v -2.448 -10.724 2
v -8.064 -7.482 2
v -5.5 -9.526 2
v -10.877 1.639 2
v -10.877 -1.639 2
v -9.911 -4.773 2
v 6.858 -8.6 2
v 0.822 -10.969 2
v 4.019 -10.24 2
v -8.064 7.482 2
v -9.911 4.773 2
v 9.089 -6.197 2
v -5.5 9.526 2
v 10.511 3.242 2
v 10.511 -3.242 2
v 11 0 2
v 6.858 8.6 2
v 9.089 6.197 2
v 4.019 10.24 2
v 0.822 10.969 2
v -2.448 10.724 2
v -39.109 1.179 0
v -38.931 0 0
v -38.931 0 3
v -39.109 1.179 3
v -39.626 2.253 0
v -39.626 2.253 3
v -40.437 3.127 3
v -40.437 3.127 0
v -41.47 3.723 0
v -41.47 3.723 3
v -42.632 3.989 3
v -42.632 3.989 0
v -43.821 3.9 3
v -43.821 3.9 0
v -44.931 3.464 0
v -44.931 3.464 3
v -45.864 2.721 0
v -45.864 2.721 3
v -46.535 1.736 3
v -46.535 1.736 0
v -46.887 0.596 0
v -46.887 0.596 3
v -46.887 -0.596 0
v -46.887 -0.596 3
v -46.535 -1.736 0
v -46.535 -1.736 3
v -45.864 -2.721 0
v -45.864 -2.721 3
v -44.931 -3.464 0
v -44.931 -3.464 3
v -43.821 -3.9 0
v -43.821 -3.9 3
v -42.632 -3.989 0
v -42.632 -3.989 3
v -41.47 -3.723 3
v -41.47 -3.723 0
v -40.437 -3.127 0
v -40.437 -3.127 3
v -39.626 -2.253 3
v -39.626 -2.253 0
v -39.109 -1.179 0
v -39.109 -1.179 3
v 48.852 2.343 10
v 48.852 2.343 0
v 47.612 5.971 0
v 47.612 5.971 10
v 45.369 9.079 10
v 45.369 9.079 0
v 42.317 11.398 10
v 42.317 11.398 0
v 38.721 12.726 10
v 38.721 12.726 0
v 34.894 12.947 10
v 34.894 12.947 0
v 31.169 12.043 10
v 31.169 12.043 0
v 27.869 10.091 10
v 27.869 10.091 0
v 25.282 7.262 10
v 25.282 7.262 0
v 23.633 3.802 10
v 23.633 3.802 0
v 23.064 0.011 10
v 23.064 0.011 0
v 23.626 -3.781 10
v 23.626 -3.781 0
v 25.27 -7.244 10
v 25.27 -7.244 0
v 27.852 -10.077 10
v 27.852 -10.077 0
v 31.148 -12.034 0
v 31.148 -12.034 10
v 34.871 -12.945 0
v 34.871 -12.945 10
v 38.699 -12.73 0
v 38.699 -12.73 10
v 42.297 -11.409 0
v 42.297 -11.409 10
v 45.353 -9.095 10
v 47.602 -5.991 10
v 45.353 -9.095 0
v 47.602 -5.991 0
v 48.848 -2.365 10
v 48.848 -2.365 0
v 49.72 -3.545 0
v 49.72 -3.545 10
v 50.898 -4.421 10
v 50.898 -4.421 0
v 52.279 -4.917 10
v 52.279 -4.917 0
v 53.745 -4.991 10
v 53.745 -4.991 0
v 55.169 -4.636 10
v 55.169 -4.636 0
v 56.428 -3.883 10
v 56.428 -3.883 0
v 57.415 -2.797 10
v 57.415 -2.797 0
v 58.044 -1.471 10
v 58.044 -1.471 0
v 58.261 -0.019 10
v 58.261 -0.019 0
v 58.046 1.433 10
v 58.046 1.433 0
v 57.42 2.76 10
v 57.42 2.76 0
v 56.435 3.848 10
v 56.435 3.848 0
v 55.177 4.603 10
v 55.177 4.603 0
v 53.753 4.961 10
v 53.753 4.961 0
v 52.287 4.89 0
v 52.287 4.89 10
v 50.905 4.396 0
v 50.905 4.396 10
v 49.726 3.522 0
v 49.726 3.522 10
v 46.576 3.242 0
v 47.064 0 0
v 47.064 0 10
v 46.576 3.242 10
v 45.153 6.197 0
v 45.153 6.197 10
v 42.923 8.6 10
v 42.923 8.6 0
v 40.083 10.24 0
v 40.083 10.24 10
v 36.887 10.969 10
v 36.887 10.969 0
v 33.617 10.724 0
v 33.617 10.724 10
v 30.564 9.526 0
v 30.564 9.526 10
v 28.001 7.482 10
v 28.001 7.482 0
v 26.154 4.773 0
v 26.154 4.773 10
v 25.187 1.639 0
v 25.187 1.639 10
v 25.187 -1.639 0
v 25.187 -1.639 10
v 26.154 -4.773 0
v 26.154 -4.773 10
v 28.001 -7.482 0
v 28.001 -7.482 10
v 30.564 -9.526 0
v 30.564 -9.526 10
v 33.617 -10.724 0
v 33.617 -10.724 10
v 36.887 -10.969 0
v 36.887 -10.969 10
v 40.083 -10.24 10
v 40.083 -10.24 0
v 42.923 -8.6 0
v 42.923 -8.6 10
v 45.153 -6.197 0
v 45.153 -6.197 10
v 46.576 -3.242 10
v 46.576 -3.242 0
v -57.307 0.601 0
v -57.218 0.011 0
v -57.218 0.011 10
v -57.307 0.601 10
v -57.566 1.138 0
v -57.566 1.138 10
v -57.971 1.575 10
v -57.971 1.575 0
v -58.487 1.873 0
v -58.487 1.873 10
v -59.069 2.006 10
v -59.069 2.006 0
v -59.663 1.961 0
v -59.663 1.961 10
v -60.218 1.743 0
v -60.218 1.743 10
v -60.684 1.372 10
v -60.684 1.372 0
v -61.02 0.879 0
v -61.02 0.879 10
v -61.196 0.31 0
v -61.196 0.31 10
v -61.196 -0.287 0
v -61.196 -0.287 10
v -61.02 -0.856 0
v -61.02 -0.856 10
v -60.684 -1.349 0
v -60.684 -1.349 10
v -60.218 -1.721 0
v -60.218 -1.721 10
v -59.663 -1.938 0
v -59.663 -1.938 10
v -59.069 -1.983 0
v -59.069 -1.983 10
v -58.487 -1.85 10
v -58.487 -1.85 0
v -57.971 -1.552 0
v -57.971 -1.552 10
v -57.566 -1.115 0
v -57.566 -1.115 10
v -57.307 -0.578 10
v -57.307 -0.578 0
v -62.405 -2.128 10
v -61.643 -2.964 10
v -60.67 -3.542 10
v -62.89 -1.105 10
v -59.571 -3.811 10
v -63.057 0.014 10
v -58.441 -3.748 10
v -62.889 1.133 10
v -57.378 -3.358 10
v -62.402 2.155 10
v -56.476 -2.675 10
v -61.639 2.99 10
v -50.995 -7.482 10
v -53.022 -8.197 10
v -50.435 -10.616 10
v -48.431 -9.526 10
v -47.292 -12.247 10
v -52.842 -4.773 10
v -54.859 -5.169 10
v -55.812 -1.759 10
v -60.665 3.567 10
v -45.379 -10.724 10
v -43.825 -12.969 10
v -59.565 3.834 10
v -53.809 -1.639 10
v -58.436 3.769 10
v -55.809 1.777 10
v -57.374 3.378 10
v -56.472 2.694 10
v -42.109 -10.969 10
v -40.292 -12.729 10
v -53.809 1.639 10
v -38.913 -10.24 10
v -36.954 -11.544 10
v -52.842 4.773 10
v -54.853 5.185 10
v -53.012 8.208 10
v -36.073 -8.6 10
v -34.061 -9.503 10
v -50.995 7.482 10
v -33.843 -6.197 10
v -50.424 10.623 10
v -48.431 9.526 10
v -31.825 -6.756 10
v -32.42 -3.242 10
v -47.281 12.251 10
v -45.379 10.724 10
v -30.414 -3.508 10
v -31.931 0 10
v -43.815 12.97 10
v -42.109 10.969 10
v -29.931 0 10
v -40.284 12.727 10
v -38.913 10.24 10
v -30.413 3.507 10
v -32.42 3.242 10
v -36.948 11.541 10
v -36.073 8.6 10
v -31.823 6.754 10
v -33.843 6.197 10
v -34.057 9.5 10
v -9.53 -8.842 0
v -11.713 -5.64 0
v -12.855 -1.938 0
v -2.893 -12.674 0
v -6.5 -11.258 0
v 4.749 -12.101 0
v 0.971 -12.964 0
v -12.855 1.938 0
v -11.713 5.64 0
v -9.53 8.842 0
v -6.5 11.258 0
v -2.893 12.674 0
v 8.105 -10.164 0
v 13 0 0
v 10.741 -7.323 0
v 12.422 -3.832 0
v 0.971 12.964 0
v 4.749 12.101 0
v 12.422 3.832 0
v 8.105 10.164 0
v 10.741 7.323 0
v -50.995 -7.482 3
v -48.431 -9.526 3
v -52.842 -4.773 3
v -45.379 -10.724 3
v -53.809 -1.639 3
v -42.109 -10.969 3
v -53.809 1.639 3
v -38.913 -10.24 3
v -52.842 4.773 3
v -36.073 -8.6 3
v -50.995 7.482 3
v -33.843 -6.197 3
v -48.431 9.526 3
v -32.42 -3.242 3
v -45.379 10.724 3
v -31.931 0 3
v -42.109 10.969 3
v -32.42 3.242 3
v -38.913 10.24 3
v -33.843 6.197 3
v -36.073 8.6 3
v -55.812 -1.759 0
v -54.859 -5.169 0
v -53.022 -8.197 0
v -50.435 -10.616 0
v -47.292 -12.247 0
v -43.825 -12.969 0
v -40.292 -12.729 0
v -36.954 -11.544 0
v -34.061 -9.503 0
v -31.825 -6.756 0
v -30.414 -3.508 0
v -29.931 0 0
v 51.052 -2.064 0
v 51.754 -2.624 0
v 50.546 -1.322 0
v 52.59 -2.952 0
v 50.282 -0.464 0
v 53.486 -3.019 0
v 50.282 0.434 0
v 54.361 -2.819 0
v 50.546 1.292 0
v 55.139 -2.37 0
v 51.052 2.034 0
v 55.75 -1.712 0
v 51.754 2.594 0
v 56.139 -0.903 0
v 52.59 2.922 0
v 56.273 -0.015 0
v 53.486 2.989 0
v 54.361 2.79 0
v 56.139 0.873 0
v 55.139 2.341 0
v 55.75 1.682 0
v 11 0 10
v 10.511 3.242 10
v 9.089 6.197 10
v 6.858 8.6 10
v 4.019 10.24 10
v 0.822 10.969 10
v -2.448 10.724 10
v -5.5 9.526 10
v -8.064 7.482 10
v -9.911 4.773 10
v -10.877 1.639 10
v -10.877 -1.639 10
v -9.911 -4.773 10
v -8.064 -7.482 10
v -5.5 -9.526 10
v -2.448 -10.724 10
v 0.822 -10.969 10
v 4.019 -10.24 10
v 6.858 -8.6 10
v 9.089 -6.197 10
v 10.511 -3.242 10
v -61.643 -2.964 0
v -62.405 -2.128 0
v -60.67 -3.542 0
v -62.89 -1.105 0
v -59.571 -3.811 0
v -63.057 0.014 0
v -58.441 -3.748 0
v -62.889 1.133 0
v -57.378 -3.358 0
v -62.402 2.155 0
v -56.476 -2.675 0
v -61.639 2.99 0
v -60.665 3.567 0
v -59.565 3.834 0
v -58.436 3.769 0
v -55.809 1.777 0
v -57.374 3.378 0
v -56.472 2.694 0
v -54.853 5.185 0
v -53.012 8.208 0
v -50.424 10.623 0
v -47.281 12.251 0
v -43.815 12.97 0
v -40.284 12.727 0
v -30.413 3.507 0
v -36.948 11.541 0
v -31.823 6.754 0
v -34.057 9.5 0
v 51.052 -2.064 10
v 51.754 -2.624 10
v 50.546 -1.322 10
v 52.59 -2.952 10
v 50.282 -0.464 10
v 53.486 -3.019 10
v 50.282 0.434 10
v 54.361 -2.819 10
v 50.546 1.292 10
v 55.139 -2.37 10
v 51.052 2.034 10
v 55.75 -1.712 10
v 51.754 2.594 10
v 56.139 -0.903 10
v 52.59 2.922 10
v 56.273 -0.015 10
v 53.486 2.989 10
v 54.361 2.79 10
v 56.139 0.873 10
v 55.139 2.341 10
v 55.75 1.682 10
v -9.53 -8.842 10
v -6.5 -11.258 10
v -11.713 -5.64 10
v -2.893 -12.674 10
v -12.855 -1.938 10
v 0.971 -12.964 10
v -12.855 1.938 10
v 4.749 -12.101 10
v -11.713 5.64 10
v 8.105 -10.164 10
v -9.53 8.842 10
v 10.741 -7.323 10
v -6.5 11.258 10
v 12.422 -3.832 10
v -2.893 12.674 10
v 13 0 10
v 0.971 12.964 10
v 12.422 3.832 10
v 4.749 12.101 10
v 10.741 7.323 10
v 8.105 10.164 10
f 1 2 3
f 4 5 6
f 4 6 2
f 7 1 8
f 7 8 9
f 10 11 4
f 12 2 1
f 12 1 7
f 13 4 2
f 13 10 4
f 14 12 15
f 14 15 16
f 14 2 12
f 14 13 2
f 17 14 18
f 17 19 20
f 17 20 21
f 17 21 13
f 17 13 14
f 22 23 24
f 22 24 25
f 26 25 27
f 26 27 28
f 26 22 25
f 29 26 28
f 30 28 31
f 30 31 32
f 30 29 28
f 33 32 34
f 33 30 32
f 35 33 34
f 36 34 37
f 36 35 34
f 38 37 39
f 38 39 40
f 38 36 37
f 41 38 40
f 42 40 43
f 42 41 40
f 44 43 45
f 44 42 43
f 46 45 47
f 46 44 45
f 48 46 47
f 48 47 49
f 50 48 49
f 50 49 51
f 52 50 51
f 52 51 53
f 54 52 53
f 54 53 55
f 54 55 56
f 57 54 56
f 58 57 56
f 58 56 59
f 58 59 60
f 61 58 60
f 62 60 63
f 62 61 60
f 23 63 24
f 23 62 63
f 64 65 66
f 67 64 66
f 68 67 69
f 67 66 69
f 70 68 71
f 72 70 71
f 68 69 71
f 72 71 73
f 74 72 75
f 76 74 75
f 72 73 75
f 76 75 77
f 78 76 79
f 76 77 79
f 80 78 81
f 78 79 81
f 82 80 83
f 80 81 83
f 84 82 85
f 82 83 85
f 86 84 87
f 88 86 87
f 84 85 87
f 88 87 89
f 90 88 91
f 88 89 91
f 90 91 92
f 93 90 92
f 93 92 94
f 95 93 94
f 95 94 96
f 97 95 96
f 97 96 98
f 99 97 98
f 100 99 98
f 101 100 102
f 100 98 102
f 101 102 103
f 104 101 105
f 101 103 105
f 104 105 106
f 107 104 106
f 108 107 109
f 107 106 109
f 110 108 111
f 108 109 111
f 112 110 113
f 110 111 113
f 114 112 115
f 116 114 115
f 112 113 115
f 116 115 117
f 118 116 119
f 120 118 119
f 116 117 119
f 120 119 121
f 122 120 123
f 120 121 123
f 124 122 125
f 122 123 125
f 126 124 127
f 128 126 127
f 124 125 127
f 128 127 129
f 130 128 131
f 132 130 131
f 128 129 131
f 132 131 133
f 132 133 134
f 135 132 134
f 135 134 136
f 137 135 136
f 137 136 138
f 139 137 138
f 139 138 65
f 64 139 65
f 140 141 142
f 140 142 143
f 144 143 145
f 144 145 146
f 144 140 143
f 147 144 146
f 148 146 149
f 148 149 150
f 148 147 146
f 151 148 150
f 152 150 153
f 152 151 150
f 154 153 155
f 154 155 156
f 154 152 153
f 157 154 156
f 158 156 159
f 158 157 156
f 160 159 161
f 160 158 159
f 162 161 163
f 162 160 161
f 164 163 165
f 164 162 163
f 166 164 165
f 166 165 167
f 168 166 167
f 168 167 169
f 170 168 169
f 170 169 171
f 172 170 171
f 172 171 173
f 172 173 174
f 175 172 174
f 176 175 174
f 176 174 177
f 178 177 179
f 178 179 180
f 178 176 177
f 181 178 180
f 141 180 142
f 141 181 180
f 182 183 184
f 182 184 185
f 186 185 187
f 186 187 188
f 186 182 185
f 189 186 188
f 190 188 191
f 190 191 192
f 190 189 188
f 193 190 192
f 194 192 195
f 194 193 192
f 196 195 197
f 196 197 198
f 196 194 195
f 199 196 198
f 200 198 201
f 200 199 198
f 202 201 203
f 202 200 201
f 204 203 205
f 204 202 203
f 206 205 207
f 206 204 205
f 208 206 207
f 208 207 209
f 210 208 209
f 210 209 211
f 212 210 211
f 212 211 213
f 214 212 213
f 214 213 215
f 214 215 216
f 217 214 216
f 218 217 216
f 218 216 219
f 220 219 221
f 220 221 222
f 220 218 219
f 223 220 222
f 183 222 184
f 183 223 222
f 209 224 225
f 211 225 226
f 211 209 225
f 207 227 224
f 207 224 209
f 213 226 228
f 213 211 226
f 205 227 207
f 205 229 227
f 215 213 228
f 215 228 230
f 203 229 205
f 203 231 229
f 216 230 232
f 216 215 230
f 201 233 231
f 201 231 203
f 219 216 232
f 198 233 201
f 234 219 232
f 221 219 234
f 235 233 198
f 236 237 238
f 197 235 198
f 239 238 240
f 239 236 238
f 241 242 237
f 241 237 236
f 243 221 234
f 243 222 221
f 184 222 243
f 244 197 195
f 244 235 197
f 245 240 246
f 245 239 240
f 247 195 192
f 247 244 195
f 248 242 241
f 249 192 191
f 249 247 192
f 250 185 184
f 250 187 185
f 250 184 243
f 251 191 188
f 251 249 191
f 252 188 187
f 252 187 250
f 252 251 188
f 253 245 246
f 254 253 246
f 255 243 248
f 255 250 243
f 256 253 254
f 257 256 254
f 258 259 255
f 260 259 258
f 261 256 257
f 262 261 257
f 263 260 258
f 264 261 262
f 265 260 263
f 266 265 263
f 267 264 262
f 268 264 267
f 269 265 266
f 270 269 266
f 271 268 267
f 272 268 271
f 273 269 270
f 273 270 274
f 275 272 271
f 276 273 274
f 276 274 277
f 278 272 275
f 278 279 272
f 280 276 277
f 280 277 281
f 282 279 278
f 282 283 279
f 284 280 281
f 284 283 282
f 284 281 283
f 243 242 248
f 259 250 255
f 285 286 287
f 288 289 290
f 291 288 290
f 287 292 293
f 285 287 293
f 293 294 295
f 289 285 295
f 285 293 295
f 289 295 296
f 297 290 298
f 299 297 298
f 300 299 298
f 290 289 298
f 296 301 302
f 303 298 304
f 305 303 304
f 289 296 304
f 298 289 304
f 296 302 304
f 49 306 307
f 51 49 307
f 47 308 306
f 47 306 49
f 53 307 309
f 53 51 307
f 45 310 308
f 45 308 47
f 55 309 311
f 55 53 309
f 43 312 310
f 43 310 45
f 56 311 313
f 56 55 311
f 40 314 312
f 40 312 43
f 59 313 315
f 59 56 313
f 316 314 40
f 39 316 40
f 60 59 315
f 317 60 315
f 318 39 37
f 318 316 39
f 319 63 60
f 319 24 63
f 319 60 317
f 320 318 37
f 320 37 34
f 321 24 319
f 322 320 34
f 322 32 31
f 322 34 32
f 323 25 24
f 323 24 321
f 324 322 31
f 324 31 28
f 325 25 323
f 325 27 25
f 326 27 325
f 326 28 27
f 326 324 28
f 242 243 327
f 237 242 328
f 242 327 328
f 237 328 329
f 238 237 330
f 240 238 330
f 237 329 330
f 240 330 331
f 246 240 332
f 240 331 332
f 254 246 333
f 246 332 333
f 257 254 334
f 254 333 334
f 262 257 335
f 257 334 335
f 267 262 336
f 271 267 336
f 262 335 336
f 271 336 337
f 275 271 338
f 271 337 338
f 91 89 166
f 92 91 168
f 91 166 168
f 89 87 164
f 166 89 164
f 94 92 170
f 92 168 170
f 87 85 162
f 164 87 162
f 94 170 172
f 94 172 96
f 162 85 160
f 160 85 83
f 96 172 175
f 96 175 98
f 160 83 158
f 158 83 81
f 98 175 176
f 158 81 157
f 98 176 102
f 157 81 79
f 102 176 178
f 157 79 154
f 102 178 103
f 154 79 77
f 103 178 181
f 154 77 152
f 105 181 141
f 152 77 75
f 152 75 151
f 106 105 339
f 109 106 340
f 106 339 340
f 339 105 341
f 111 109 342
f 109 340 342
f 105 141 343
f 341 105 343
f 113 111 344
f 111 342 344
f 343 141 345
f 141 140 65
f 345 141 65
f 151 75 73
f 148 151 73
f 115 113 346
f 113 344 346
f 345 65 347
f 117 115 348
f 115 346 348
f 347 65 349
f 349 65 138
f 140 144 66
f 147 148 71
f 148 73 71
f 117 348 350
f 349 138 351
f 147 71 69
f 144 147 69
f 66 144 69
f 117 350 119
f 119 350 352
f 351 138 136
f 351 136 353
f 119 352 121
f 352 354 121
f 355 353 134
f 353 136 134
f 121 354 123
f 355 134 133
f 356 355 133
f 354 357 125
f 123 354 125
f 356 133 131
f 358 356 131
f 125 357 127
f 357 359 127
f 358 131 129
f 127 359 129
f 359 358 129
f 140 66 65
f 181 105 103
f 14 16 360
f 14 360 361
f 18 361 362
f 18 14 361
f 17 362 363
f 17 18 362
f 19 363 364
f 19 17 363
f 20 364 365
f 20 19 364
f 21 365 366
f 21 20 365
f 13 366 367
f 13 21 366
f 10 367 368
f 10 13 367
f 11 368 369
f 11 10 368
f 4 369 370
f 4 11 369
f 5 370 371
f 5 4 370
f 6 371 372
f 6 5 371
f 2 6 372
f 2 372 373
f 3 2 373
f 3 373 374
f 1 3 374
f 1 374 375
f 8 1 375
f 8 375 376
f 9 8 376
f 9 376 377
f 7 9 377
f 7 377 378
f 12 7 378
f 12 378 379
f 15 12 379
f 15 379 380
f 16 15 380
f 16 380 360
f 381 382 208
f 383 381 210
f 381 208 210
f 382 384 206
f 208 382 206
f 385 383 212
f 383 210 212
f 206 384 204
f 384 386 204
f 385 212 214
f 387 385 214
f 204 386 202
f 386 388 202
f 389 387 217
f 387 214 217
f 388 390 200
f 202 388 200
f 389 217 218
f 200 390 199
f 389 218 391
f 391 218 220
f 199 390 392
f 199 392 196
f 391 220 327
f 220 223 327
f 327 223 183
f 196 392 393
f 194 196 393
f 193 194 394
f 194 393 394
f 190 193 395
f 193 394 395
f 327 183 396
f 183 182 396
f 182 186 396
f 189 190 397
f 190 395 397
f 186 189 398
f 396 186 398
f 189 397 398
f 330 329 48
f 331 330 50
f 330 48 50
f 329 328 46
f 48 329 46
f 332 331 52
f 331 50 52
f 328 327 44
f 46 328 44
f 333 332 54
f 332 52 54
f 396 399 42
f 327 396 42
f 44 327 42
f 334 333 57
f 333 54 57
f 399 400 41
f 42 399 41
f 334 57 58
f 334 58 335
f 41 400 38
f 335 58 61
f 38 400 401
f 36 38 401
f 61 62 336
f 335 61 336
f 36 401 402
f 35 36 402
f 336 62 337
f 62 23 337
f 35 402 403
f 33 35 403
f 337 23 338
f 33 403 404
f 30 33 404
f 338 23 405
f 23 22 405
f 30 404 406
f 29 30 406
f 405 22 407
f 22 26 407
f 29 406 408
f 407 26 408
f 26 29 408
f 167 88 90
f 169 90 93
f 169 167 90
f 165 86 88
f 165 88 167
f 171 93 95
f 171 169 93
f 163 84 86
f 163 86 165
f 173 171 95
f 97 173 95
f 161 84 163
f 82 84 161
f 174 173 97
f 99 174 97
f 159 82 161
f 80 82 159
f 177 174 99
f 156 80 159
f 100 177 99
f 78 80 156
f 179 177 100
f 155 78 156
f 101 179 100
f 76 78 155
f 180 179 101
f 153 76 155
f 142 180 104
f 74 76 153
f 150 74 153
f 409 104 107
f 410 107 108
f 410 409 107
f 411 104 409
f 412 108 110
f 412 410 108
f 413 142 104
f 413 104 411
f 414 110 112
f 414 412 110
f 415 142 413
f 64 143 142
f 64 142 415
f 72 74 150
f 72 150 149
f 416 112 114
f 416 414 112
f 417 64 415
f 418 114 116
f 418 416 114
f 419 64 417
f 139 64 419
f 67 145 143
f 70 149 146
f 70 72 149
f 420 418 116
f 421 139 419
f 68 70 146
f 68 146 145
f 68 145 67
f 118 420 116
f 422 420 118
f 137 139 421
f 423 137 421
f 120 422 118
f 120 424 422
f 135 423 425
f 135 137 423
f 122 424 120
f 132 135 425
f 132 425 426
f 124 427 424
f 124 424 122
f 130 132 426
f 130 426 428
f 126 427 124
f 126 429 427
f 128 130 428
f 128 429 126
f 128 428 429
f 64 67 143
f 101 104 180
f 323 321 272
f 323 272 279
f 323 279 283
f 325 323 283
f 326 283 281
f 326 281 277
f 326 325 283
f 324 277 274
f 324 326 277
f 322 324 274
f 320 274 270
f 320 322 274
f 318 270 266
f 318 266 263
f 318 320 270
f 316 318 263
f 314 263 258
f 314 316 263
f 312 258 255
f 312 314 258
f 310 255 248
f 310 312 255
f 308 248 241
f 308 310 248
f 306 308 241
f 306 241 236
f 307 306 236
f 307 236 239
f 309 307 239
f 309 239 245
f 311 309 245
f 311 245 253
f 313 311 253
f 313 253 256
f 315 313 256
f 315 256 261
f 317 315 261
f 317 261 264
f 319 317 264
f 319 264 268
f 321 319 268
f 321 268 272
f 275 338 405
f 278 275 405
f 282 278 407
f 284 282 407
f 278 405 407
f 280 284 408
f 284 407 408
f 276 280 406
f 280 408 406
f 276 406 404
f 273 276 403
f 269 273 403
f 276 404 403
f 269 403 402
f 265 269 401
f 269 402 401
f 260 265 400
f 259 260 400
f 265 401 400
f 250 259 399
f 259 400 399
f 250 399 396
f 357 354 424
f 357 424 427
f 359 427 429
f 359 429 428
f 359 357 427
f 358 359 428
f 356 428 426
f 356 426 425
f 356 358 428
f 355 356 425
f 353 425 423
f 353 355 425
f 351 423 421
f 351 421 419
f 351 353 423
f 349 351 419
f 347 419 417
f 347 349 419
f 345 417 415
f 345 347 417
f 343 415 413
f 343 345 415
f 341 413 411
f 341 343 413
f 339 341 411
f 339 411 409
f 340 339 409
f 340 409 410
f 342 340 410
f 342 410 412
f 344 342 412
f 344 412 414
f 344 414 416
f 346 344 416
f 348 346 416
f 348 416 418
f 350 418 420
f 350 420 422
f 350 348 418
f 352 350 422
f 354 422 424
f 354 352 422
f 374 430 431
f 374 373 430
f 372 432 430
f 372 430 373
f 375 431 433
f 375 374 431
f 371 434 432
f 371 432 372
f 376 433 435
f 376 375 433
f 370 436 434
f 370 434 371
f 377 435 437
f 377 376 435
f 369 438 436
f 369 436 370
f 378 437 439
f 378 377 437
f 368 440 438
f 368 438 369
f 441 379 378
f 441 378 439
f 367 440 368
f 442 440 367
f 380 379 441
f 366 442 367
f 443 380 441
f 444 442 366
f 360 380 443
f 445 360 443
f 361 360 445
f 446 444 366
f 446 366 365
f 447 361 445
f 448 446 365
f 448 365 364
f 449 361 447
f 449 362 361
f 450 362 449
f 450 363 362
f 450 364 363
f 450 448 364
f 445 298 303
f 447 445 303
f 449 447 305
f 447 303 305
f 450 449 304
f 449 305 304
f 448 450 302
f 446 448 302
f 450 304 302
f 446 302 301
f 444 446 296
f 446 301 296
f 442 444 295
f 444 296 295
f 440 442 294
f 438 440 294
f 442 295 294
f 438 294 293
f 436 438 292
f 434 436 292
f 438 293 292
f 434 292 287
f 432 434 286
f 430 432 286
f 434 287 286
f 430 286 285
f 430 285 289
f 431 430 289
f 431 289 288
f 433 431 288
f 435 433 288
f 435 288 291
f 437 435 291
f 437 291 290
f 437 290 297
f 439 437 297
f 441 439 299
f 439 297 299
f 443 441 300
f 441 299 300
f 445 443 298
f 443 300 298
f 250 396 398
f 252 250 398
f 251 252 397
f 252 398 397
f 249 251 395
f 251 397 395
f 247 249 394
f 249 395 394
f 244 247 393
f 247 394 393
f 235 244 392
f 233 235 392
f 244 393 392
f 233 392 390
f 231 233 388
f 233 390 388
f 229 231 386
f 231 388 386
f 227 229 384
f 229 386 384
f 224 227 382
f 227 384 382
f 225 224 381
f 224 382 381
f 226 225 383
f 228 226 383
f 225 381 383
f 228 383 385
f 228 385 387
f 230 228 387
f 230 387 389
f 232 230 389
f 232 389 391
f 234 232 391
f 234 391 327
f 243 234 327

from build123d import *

# Parameters (mm, degrees)
F0_R     = 11
F1_DEPTH = 10
F0_R_2   = 4
F2_DEPTH = 3
F0_R_3   = 2
F3_DEPTH = 10
F4_R     = 13
F4_R_2   = 11
F5_DEPTH = 10
F6_DEPTH = 2
F7_R     = 11
F7_R_2   = 3.012629
F8_DEPTH = 10


with BuildPart() as f1:
    # F0 (on Top) → F1 (new body)
    with BuildSketch(Plane.XY):
        with BuildLine():
            ThreePointArc((-55.811908, -1.758521), (-42.050108, -12.970094), (-29.931396, 0))
            ThreePointArc((-29.931396, 0), (-42.041014, 12.969473), (-55.80943, 1.776582))
            ThreePointArc((-55.80943, 1.776582), (-55.931393, 0.009115), (-55.811908, -1.758521))
        make_face()
        with Locations((-42.931396, 0)):
            Circle(F0_R, mode=Mode.SUBTRACT)
    extrude(amount=F1_DEPTH)

    # F0 (on Top) → F2 (join)
    with BuildSketch(Plane.XY):
        with Locations((-42.931396, 0)):
            Circle(F0_R)
        with Locations((-42.931396, 0)):
            Circle(F0_R_2, mode=Mode.SUBTRACT)
    extrude(amount=F2_DEPTH)

    # F0 (on Top) → F3 (join)
    with BuildSketch(Plane.XY):
        with BuildLine():
            ThreePointArc((-55.811908, -1.758521), (-55.931393, 0.009115), (-55.80943, 1.776582))
            ThreePointArc((-55.80943, 1.776582), (-63.056532, 0.014111), (-55.811908, -1.758521))
        make_face()
        with Locations((-59.218013, 0.011419)):
            Circle(F0_R_3, mode=Mode.SUBTRACT)
    extrude(amount=F3_DEPTH)


with BuildPart() as f5:
    # F4 (on Top) → F5 (new body)
    with BuildSketch(Plane.XY):
        Circle(F4_R)
        Circle(F4_R_2, mode=Mode.SUBTRACT)
    extrude(amount=F5_DEPTH)

    # F4 (on Top) → F6 (join)
    with BuildSketch(Plane.XY):
        Circle(F4_R_2)
    extrude(amount=F6_DEPTH)


with BuildPart() as f8:
    # F7 (on Top) → F8 (new body)
    with BuildSketch(Plane.XY):
        with BuildLine():
            ThreePointArc((48.847508, -2.365263), (49.010131, -1.187598), (49.06449, 0))
            ThreePointArc((49.06449, 0), (49.011149, 1.176448), (48.851563, 2.343241))
            ThreePointArc((48.851563, 2.343241), (23.064495, 0.011196), (48.847508, -2.365263))
        make_face()
        with Locations((36.06449, 0)):
            Circle(F7_R, mode=Mode.SUBTRACT)
        with BuildLine():
            ThreePointArc((48.851563, 2.343241), (49.011149, 1.176448), (49.06449, 0))
            ThreePointArc((49.06449, 0), (49.010131, -1.187598), (48.847508, -2.365263))
            ThreePointArc((48.847508, -2.365263), (58.260596, -0.019116), (48.851563, 2.343241))
        make_face()
        with Locations((53.260598, -0.01481)):
            Circle(F7_R_2, mode=Mode.SUBTRACT)
    extrude(amount=F8_DEPTH)


solid = Compound([f1.part, f5.part, f8.part])
